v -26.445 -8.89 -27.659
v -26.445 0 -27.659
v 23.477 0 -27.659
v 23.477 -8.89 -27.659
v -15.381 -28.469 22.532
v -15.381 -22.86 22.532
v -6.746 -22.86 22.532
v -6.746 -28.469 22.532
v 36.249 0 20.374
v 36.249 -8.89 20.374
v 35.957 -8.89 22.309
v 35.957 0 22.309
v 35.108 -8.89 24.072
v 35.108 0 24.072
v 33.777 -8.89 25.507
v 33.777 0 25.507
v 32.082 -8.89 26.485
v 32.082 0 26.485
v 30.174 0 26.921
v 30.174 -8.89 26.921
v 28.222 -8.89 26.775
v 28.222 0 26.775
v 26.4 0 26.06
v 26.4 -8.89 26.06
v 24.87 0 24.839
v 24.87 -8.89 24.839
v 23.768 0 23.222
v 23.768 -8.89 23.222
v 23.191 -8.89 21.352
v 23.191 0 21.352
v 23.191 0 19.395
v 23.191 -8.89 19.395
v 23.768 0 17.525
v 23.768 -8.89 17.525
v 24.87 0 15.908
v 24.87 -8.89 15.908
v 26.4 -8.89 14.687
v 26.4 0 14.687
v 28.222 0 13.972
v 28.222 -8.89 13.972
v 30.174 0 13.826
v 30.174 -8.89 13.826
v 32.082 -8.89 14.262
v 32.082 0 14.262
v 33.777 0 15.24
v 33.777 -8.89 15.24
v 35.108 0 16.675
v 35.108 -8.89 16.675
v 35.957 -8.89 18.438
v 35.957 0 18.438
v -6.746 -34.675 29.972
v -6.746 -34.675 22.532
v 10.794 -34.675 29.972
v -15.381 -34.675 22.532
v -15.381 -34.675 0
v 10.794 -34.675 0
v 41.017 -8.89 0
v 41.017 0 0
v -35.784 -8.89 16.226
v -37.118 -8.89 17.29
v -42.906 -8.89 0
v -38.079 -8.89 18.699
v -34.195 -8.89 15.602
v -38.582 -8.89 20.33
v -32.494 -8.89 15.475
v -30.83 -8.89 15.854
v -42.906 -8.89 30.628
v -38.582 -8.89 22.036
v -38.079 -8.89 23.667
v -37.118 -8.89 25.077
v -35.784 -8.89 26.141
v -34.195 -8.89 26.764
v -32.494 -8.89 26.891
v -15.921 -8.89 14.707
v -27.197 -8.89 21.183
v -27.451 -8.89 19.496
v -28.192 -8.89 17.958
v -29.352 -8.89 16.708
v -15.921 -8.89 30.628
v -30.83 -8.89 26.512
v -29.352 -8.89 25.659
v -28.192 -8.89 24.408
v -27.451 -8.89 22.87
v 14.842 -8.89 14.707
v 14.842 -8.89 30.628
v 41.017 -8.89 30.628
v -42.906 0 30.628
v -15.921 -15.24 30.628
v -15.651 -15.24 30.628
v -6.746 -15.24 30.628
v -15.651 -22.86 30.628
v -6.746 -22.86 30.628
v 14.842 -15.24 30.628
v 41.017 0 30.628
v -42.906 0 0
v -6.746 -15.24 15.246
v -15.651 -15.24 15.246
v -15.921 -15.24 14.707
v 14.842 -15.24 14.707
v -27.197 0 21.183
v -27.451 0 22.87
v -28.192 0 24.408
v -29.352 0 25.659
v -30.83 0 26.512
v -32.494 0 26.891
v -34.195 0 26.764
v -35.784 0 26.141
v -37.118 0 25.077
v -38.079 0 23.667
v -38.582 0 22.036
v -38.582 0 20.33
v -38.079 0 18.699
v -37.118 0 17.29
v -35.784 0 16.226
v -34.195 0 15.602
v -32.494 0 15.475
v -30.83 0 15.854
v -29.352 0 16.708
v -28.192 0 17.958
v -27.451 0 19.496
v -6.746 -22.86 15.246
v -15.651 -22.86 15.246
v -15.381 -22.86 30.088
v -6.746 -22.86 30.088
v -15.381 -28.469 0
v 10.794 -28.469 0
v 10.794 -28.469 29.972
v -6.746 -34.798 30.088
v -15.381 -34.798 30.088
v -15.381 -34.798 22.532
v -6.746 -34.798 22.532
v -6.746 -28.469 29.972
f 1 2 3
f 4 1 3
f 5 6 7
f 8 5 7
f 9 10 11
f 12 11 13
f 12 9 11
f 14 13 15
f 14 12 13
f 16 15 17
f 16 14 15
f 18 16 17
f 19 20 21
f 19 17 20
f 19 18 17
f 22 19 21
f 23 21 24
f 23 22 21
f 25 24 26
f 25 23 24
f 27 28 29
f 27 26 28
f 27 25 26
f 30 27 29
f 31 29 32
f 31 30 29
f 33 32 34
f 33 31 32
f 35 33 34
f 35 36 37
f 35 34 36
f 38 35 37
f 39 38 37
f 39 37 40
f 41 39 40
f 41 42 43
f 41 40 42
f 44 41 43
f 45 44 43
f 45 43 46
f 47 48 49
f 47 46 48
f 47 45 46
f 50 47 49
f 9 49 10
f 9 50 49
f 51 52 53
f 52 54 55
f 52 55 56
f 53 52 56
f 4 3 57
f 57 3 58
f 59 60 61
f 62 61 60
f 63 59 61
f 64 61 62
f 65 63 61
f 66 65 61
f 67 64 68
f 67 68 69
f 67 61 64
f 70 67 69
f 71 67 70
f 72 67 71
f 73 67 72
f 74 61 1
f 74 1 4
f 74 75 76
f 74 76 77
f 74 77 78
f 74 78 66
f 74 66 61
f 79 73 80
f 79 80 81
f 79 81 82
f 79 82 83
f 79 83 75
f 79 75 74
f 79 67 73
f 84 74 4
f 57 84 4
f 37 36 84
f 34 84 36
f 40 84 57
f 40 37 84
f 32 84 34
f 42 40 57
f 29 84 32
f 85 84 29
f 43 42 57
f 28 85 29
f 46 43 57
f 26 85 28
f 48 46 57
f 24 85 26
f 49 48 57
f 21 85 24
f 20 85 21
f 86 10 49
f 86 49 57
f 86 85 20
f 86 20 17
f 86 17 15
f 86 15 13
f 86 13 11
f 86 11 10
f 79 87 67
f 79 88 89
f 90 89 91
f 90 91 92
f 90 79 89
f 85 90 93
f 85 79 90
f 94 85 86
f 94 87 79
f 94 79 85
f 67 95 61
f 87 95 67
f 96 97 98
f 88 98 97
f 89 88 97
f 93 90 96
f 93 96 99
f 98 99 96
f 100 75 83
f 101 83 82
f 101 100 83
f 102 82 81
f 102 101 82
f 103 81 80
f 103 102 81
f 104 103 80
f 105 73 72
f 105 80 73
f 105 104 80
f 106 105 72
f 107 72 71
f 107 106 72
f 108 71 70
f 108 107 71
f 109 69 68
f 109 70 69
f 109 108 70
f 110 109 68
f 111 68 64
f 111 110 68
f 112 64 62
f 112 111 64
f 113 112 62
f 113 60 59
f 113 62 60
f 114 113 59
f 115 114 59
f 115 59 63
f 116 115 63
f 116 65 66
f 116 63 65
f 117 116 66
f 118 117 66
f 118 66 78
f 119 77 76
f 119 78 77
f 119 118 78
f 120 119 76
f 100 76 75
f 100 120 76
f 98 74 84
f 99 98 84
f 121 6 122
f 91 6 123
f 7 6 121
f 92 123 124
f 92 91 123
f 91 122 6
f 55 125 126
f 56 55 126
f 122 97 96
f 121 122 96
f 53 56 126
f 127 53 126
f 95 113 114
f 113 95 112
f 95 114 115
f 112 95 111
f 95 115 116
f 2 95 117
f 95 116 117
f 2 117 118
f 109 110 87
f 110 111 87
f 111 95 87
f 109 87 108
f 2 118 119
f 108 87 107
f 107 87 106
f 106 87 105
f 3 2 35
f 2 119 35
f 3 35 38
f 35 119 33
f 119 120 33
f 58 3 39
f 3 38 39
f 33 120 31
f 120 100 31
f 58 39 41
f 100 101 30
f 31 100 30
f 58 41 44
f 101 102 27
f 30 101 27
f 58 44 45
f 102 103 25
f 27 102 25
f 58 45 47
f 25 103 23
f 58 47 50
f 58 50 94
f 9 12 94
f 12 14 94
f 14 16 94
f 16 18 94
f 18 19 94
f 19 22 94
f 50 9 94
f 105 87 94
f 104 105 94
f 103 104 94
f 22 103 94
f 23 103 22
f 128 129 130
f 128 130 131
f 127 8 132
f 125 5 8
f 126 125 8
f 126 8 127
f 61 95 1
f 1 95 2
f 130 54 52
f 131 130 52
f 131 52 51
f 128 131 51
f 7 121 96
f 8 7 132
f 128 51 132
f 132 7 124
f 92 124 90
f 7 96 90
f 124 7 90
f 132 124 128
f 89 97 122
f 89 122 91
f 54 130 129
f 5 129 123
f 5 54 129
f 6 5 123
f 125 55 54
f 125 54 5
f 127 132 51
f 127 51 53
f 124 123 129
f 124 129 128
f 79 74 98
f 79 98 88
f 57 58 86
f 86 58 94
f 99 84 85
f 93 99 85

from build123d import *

# Parameters (mm, degrees)
F0_W      = 83.9228034019
F0_H      = 30.6277740747
F1_DEPTH  = 8.89
F2_W      = 30.7626985013
F2_H      = 15.9210450947
F3_DEPTH  = 15.24
F4_W      = 8.9049930684
F4_H      = 15.3813483194
F5_DEPTH  = 22.86
F6_W      = 8.6351442151
F6_H      = 7.55575113
F7_DEPTH  = 34.798
F8_W      = 26.175278239
F8_H      = 6.2065087259
F9_DEPTH  = 29.972
F10_R     = 5.7243436082
F10_R_2   = 6.565694646
F11_DEPTH = 25.4


with BuildPart() as f1:
    # F0 (on Front) → F1 (new body)
    with BuildSketch(Plane.XZ):
        with Locations((-0.9444691241, 15.3138870373)):
            Rectangle(F0_W, F0_H)
        Polygon((41.0169325769, 0), (-42.9058708251, 0), (-26.445126161, -27.6594422758), (23.4767943621, -27.6594422758), align=None)
    extrude(amount=F1_DEPTH)

    # F2 (on Front) → F3 (join)
    with BuildSketch(Plane.XZ):
        with Locations((-0.5396958441, 22.6672515273)):
            Rectangle(F2_W, F2_H)
    extrude(amount=F3_DEPTH)

    # F4 (on Front) → F5 (join)
    with BuildSketch(Plane.XZ):
        with Locations((-11.1987015698, 22.937099915)):
            Rectangle(F4_W, F4_H)
    extrude(amount=F5_DEPTH)

    # F6 (on Front) → F7 (join)
    with BuildSketch(Plane.XZ):
        with Locations((-11.0637771431, 26.3102026656)):
            Rectangle(F6_W, F6_H)
    extrude(amount=F7_DEPTH)

    # F8 (on Top) → F9 (join)
    with BuildSketch(Plane.XY):
        with Locations((-2.2937101312, -31.5722431988)):
            Rectangle(F8_W, F8_H)
    extrude(amount=F9_DEPTH)

    # F10 (on Front) → F11 (cut)
    with BuildSketch(Plane.XZ):
        with Locations((-32.9214856029, 21.1830865592)):
            Circle(F10_R)
        with Locations((29.6833030879, 20.3735418618)):
            Circle(F10_R_2)
    extrude(amount=F11_DEPTH, mode=Mode.SUBTRACT)


solid = f1.part
